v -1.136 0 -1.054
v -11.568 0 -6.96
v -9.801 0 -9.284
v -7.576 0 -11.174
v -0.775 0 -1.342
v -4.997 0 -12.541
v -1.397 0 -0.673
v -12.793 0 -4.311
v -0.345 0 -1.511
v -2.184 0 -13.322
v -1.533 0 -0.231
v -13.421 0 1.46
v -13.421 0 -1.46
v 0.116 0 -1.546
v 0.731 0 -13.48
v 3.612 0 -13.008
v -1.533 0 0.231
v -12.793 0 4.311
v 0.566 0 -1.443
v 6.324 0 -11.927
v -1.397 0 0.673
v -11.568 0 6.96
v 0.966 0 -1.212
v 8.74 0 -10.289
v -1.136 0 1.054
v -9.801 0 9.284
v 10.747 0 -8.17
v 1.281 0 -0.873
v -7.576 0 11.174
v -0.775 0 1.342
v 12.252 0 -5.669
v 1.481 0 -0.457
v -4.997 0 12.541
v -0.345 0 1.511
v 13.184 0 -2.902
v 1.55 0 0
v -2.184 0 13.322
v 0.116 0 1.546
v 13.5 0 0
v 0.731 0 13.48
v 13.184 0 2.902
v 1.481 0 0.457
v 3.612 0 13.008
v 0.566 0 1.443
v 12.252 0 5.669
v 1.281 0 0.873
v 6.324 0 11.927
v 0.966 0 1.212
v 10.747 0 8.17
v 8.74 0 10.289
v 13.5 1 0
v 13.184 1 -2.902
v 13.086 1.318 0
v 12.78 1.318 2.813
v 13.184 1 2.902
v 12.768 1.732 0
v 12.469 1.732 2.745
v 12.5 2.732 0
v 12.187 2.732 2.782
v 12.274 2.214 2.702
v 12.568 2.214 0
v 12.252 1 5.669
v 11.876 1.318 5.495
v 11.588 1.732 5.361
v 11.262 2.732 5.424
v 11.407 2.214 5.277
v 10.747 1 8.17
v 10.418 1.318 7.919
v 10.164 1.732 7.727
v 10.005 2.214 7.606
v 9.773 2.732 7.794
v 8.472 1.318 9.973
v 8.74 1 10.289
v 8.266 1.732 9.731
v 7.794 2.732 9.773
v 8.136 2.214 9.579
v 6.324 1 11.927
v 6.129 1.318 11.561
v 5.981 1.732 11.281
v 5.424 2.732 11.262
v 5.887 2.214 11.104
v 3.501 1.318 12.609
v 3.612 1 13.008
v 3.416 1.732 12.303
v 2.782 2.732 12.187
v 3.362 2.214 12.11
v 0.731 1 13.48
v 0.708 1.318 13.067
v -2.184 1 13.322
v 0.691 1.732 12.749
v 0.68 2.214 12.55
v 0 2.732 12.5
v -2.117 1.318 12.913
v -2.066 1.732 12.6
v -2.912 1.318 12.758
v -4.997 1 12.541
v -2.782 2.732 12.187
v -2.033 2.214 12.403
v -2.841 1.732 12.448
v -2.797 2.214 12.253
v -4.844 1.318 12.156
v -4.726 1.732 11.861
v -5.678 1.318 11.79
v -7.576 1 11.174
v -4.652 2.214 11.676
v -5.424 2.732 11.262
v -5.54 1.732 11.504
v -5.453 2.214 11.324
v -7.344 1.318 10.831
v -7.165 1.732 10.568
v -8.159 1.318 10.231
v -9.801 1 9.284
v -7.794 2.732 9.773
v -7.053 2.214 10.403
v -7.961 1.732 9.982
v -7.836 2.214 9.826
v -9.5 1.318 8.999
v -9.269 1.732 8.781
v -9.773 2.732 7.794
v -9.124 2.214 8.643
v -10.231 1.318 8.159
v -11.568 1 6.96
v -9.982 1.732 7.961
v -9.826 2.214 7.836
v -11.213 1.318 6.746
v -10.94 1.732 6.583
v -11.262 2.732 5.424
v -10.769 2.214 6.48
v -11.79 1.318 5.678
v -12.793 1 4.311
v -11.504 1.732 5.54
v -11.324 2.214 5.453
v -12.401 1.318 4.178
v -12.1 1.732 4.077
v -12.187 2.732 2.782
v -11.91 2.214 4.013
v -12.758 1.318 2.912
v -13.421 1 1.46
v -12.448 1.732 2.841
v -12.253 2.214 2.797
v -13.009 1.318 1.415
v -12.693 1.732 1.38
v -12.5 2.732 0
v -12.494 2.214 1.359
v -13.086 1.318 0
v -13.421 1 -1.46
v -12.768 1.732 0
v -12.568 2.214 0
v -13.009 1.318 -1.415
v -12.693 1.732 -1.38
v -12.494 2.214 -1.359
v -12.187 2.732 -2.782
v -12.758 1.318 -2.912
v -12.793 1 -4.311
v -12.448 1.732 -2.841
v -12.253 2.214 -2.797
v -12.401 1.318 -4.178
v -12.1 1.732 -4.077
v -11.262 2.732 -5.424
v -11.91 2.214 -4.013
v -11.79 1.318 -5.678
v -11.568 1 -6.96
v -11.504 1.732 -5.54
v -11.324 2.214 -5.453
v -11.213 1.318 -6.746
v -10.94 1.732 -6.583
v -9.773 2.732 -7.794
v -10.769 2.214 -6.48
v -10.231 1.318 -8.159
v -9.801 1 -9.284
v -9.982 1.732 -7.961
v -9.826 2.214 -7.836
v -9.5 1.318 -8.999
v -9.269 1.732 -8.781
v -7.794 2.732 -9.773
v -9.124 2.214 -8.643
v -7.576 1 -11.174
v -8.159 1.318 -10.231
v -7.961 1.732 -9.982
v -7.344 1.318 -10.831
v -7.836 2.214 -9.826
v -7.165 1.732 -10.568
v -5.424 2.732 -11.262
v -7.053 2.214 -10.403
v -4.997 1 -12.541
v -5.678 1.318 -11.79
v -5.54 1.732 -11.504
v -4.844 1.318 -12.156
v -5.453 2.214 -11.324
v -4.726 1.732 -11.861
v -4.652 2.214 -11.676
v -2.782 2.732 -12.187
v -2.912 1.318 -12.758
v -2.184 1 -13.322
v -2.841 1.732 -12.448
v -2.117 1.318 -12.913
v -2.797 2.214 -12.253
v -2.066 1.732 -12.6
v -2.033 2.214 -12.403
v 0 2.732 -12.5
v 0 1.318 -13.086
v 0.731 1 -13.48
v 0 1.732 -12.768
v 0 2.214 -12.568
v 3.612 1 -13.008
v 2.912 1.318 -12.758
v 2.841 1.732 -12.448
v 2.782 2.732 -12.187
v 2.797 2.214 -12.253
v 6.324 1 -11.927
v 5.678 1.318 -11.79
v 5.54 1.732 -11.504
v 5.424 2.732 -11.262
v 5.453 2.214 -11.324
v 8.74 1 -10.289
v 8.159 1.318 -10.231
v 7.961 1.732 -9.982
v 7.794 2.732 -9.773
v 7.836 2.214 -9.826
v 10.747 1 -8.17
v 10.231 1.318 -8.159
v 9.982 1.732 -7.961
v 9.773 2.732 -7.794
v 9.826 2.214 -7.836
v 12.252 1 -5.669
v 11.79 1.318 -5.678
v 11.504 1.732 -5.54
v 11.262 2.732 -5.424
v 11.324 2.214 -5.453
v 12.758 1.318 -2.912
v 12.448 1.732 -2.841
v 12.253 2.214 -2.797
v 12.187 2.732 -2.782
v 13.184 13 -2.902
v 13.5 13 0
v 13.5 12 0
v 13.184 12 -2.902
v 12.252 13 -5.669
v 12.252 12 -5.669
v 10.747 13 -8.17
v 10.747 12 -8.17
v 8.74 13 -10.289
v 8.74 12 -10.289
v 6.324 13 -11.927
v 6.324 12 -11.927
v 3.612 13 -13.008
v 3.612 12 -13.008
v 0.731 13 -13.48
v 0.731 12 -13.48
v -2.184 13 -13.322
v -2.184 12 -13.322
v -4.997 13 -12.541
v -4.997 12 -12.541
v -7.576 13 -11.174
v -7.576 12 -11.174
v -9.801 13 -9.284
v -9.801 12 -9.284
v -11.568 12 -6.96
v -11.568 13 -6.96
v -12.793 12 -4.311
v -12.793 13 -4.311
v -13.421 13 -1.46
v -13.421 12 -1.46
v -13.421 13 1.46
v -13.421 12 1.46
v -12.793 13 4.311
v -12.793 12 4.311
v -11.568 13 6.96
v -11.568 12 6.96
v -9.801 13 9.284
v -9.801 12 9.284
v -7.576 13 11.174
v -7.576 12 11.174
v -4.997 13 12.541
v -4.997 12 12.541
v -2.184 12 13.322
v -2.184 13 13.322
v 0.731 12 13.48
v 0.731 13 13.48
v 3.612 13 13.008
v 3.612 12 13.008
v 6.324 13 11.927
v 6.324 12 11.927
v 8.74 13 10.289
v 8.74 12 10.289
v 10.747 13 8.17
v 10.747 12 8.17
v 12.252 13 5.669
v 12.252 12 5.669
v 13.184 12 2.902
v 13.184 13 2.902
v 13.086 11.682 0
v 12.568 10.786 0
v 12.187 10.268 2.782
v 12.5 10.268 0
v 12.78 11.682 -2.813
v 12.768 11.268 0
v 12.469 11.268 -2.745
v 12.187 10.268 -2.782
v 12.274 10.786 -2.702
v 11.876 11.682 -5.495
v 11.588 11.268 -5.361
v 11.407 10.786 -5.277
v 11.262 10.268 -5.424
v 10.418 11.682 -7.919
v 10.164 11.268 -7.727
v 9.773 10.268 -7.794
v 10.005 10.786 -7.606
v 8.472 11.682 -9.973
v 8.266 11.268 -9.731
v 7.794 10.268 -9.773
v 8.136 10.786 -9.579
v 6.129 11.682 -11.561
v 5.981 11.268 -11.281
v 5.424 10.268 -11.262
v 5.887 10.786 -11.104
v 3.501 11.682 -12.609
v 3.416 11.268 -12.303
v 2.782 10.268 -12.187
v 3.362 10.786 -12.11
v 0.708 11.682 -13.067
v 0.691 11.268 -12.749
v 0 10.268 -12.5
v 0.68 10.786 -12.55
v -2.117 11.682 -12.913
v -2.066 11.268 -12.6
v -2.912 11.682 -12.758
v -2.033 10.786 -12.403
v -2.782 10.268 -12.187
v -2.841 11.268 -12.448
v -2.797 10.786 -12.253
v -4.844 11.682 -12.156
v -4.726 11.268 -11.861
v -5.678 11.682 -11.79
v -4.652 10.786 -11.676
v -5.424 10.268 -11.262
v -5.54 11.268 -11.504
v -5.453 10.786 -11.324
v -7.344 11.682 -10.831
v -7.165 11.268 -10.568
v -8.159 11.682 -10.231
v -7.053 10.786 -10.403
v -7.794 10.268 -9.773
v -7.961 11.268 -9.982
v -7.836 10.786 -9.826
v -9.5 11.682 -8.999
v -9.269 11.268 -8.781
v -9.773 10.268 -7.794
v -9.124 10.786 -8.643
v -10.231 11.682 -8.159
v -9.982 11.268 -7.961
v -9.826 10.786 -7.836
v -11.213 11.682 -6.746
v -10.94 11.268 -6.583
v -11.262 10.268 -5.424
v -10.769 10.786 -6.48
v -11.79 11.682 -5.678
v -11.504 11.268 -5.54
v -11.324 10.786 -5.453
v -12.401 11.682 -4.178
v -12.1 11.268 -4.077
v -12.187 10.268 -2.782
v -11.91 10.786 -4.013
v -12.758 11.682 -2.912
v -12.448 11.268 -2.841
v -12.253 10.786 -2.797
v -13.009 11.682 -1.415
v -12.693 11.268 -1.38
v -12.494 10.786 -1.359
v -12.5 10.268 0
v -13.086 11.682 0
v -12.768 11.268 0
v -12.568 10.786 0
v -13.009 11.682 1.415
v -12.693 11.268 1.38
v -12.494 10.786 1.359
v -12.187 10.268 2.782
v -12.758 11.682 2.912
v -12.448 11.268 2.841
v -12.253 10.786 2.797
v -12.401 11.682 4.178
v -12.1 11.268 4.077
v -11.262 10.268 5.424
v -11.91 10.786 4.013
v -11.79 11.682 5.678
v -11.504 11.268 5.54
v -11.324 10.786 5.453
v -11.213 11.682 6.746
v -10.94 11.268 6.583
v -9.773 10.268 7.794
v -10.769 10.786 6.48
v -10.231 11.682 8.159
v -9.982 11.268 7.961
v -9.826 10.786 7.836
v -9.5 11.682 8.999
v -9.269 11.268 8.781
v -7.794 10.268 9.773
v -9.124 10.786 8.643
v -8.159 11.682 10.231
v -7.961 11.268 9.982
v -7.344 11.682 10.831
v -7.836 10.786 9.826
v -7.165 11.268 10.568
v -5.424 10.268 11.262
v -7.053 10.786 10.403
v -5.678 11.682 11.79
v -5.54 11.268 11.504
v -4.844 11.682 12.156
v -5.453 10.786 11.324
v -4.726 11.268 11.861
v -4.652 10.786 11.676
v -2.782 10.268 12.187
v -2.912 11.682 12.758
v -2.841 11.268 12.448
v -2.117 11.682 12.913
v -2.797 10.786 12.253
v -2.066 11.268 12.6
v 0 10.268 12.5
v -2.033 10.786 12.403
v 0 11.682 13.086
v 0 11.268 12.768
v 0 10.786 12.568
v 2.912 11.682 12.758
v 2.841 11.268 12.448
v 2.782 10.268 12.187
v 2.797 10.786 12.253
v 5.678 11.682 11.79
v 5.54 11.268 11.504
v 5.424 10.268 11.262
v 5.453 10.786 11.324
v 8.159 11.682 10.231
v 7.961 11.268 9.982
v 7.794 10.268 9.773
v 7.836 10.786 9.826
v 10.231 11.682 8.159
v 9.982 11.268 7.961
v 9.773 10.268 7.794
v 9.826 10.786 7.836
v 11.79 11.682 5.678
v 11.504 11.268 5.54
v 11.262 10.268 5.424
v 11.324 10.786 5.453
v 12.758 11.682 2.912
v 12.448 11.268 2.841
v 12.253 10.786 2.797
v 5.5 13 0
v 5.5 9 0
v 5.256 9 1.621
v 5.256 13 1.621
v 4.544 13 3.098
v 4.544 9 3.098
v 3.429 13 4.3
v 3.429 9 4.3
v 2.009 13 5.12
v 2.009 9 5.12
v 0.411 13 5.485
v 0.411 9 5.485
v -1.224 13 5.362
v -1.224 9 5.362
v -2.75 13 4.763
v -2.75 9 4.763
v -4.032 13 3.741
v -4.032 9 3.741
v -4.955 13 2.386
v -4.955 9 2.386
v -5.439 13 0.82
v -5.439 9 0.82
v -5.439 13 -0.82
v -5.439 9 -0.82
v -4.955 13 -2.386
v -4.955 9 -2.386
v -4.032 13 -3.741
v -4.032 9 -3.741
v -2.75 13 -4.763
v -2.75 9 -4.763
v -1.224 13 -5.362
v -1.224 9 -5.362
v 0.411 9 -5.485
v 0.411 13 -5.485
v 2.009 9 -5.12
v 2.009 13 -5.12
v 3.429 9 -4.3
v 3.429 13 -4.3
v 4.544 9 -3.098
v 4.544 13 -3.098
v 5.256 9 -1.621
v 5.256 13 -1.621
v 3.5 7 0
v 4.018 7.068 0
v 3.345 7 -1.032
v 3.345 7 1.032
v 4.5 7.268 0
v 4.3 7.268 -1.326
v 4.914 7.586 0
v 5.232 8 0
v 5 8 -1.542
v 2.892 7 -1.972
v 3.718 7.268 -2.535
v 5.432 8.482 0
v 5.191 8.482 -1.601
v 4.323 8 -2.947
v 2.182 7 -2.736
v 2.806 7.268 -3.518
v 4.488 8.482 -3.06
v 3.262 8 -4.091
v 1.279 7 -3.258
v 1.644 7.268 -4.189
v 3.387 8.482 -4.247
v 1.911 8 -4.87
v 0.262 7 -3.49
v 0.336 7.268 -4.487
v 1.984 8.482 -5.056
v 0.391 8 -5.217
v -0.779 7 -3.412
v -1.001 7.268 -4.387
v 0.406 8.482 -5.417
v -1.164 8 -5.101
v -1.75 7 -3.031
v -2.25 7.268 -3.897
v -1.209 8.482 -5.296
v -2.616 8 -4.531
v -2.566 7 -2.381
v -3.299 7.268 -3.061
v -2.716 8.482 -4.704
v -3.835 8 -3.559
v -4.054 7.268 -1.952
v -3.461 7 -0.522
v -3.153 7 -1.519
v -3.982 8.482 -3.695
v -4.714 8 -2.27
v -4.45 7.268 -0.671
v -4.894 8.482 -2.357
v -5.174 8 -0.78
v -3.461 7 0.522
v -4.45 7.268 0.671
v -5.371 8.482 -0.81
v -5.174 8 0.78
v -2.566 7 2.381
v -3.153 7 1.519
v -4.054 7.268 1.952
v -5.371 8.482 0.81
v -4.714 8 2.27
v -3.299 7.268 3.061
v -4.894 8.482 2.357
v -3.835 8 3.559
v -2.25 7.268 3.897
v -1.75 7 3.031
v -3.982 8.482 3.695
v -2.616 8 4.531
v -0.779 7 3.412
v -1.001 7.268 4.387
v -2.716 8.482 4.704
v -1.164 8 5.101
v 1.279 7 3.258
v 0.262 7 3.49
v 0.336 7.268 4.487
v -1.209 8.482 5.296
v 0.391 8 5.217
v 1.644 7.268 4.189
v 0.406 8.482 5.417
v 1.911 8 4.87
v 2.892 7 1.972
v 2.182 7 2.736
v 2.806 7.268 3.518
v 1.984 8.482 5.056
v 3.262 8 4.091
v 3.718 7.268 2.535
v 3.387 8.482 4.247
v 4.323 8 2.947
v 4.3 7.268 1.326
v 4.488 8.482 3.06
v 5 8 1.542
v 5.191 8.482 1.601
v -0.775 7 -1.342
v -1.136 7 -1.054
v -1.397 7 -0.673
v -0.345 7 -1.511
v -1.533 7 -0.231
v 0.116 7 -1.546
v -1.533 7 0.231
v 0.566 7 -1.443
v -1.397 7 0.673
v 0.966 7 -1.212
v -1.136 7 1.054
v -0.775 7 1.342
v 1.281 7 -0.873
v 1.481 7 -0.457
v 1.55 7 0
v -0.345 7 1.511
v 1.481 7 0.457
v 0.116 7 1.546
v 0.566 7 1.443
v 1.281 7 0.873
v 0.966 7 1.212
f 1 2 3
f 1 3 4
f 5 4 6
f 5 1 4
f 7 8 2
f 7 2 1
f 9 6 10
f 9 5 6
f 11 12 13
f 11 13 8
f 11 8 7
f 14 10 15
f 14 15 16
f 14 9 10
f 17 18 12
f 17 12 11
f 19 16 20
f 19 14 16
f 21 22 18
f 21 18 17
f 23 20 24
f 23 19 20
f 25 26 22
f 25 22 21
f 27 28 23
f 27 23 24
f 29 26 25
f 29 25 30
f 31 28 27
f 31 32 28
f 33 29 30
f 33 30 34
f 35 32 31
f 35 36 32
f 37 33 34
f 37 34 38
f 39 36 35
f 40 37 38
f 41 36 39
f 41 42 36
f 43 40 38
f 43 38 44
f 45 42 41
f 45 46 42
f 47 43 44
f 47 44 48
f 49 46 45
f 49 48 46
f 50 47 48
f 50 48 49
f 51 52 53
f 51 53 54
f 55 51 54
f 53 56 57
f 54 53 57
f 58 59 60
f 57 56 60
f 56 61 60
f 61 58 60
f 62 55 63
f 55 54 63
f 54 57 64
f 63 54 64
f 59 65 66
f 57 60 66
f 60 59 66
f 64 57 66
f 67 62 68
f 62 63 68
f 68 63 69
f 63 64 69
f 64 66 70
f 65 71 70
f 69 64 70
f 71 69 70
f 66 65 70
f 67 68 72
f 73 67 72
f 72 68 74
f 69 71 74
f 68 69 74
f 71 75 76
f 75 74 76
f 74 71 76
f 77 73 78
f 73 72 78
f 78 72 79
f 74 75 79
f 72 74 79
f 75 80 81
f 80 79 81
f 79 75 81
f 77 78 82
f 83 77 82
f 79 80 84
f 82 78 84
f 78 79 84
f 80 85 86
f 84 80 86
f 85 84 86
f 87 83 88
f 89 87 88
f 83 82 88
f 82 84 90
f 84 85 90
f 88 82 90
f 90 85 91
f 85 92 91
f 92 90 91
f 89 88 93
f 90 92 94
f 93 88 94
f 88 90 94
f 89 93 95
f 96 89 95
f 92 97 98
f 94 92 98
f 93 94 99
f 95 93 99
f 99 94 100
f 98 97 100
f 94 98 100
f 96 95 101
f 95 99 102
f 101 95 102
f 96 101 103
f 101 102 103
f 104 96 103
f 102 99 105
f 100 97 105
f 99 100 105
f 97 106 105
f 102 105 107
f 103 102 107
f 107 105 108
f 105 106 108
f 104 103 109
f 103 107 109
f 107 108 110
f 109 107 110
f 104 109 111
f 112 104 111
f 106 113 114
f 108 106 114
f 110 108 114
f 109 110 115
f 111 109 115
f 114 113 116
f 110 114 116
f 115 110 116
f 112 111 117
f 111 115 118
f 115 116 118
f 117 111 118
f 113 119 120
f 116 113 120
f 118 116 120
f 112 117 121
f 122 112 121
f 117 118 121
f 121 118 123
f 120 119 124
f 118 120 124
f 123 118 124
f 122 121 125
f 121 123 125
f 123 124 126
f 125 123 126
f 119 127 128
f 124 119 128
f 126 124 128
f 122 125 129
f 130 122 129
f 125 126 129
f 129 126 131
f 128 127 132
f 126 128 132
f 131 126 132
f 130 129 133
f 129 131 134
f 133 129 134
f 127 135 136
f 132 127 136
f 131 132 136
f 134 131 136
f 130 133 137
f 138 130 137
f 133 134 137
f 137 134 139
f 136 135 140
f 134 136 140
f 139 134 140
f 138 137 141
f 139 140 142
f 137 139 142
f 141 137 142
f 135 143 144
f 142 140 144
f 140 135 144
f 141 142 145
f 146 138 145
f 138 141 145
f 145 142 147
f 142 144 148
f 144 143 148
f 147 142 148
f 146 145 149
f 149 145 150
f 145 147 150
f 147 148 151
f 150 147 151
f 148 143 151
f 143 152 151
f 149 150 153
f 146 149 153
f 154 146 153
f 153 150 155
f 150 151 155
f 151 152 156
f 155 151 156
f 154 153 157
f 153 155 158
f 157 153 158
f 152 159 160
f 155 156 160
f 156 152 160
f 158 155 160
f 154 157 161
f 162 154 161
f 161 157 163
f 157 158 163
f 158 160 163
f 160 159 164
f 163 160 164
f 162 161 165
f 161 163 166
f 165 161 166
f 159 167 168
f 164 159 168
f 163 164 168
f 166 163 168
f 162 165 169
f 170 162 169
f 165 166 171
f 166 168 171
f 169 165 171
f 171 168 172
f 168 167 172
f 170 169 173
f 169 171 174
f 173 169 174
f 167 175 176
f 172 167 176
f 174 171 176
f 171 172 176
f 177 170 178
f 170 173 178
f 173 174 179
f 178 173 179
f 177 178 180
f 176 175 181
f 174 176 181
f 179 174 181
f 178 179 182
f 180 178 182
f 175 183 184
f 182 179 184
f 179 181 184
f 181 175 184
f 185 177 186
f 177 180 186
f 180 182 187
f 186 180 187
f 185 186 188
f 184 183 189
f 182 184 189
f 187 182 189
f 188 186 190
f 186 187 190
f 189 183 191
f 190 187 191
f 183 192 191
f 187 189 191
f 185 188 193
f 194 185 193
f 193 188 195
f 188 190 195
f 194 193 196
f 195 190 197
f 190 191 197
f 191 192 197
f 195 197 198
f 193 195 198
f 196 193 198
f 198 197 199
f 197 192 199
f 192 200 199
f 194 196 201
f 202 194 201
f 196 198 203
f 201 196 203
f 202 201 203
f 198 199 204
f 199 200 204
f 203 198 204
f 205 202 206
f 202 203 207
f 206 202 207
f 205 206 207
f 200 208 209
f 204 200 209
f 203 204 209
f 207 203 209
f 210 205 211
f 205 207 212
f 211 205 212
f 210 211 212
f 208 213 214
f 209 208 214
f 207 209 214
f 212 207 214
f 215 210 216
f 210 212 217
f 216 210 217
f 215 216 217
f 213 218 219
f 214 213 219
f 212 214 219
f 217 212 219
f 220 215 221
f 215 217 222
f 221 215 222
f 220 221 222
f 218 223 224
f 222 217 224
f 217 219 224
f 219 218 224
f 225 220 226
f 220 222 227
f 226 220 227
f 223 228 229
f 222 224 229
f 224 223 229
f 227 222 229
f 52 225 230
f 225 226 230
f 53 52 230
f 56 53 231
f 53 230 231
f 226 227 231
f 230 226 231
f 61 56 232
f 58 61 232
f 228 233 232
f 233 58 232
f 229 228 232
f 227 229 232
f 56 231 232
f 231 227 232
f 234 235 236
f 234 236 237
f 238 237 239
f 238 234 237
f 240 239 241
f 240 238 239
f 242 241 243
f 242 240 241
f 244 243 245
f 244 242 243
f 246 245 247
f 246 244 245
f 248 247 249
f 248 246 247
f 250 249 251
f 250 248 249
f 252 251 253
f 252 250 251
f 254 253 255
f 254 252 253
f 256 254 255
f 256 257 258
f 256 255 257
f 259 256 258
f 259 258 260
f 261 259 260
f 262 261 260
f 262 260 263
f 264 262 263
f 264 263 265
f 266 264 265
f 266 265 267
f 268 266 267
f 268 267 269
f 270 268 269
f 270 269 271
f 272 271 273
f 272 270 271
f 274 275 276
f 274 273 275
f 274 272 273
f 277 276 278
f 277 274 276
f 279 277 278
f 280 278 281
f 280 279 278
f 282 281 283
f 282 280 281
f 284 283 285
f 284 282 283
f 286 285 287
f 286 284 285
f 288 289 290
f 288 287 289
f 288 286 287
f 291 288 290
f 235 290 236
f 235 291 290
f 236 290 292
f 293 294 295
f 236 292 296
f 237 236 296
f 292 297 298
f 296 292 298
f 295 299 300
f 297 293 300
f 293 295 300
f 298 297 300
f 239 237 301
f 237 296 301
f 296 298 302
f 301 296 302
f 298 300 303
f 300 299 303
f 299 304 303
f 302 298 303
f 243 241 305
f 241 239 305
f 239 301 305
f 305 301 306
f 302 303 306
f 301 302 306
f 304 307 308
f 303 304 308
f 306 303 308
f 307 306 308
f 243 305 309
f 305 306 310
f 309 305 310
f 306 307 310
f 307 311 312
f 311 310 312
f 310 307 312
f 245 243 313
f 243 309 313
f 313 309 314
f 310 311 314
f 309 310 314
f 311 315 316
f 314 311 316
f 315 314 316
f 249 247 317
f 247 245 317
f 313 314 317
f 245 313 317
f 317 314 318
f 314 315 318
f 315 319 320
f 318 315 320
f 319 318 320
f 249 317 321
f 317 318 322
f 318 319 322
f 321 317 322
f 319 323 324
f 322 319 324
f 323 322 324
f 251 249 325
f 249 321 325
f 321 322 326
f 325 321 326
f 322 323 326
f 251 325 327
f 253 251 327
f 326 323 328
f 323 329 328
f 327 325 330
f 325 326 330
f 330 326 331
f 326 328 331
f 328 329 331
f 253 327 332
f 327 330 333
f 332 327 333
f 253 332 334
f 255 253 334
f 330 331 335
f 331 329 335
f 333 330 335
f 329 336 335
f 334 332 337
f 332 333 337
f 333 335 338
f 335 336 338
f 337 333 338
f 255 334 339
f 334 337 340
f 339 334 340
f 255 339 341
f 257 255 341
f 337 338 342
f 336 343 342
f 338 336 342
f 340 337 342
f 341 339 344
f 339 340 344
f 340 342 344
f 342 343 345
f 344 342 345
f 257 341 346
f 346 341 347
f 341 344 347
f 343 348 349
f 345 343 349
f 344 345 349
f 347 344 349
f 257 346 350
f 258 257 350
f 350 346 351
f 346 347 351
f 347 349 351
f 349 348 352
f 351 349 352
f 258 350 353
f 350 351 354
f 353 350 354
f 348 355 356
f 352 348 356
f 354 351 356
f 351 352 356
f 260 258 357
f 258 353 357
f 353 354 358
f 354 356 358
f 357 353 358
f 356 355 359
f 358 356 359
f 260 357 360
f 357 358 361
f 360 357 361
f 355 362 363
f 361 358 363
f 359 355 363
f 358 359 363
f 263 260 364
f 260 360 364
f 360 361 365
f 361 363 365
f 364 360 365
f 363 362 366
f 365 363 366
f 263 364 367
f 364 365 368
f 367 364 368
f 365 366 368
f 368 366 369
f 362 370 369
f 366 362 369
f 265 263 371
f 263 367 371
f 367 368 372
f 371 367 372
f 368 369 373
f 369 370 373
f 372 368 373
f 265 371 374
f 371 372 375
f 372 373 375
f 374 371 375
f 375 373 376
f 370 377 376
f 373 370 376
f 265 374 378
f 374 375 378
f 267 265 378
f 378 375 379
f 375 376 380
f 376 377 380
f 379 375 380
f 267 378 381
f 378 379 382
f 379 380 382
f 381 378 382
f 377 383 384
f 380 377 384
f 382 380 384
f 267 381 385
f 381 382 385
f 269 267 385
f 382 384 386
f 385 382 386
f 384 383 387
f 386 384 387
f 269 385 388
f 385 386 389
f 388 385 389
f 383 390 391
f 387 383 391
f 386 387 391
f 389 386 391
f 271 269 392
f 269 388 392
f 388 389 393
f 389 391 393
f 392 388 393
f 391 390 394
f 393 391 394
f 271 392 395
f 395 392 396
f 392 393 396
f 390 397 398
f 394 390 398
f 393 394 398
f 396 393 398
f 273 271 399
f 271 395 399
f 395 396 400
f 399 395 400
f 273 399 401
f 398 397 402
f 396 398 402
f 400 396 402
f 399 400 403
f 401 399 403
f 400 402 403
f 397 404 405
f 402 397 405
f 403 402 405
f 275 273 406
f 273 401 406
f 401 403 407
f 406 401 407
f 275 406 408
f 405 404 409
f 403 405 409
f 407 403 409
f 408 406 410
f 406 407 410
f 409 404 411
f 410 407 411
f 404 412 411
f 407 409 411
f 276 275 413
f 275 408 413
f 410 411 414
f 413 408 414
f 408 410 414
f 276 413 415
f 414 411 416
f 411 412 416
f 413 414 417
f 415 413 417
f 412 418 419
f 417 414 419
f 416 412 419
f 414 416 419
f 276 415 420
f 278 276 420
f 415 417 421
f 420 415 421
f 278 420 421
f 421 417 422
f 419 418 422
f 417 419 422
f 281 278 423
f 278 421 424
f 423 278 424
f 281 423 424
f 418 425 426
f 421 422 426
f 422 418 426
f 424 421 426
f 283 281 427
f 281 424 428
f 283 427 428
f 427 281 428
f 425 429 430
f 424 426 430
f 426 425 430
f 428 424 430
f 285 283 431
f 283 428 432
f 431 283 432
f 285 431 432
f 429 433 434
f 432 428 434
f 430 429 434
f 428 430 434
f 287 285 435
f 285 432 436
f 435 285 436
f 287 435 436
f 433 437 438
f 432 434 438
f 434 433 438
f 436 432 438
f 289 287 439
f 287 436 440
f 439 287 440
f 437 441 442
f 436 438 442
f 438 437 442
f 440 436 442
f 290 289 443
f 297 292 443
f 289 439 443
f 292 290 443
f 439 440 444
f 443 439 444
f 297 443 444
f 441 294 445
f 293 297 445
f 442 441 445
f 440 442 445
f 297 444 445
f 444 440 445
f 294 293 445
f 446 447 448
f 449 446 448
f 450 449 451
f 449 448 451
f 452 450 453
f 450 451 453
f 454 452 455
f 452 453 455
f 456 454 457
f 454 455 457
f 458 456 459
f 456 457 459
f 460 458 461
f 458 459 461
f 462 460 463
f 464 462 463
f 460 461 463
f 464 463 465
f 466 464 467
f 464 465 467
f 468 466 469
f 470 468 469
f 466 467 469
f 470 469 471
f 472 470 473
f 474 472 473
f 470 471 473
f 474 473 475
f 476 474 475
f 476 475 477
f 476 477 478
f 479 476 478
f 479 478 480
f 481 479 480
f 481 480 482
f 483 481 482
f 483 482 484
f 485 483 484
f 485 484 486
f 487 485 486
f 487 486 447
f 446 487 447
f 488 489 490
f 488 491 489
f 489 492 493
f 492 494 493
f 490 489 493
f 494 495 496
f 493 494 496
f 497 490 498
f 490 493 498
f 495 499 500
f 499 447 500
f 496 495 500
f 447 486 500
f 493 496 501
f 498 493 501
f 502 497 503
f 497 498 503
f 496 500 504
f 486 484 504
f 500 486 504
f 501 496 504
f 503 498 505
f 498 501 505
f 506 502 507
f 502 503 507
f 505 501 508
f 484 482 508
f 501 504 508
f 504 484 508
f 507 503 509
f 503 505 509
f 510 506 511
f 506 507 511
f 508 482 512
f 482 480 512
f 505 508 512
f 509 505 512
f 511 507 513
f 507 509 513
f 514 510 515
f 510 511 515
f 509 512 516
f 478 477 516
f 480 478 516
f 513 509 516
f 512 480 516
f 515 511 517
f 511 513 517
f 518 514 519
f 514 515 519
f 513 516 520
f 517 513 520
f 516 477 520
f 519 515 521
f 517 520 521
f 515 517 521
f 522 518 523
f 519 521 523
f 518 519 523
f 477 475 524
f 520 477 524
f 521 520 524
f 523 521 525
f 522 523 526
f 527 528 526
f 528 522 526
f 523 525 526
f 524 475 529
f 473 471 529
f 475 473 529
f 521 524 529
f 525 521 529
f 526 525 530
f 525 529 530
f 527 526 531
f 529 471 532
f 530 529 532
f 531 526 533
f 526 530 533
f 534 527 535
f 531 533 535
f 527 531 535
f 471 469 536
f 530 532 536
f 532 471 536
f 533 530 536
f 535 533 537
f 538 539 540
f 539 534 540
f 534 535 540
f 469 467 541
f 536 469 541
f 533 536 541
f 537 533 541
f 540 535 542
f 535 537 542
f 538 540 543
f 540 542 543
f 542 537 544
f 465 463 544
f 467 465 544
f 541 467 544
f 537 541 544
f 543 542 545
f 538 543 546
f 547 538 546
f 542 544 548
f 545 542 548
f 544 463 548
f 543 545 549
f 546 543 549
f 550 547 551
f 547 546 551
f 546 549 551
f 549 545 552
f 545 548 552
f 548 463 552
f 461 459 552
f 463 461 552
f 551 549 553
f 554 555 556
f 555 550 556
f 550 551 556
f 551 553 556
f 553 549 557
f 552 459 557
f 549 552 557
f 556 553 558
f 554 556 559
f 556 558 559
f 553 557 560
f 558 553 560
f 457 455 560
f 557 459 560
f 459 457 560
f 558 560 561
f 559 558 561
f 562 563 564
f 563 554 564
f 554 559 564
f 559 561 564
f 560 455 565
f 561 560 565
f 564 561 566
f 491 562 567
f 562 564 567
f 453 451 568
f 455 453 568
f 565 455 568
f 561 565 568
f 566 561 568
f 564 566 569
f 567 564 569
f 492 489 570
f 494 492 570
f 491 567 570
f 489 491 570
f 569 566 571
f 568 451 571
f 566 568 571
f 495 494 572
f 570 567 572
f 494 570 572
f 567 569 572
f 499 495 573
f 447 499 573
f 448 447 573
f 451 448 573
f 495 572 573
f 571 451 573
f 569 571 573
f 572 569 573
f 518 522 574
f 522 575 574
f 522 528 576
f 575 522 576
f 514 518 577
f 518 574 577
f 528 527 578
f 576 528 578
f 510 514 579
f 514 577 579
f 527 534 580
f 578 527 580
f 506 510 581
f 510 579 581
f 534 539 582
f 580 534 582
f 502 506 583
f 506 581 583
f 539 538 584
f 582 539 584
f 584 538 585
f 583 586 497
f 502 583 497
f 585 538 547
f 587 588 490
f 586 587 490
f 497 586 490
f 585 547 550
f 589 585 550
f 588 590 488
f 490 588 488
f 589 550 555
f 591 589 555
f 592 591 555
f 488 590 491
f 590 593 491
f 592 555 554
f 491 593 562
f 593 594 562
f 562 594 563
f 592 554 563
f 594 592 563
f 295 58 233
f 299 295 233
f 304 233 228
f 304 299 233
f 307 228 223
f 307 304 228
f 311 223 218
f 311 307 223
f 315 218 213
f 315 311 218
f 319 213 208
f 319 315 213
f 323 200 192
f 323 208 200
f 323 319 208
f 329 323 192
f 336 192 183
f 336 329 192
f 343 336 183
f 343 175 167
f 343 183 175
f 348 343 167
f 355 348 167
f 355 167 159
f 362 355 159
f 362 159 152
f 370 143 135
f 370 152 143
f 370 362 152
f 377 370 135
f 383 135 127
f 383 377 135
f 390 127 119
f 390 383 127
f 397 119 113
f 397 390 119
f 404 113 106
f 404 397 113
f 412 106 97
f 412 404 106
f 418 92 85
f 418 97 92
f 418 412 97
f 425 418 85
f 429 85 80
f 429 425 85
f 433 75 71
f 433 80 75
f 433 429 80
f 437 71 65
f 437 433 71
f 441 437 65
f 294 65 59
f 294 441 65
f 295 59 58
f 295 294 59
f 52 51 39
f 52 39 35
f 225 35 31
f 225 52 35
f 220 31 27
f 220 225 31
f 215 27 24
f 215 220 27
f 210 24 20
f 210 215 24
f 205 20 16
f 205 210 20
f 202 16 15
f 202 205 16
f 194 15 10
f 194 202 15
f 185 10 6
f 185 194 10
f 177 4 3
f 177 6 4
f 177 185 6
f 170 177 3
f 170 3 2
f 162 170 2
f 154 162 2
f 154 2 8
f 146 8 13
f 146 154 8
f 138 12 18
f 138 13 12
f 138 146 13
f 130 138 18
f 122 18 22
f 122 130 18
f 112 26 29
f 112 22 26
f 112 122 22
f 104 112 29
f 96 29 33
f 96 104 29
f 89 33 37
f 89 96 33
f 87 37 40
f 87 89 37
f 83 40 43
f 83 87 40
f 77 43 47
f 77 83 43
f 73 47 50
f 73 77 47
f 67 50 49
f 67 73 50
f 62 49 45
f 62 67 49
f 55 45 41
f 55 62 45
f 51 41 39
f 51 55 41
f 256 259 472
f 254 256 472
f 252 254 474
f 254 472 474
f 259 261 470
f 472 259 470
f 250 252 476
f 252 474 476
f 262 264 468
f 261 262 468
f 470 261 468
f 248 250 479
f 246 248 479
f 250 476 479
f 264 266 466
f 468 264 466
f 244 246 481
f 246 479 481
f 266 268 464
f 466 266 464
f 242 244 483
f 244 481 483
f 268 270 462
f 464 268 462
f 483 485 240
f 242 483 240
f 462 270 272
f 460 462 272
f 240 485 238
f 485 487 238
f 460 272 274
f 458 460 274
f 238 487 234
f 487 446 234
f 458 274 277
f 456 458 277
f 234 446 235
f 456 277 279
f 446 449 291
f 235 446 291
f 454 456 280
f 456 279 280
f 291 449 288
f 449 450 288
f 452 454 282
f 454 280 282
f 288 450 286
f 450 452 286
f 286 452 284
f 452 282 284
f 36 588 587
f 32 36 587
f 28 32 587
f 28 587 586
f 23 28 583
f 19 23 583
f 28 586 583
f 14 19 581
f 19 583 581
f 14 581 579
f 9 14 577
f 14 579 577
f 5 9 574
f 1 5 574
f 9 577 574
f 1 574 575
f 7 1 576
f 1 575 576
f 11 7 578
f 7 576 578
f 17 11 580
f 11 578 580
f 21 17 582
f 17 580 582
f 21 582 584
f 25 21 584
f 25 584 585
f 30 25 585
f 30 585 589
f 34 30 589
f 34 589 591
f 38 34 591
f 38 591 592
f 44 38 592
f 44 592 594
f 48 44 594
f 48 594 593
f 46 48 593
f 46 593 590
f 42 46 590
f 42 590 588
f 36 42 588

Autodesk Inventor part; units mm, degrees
ref_plane "YZ Plane" through (0, 0, 0) normal (1, 0, 0) x (0, 1, 0)
ref_plane "XZ Plane" through (0, 0, 0) normal (0, 1, 0) x (-1, 0, 0)
ref_plane "XY Plane" through (0, 0, 0) normal (0, 0, 1) x (1, 0, 0)
sketch "Szkic1" plane through (0, 0, 0) normal (0, 0, 1) x (1, 0, 0)
  line L0 (0, 0) -> (13.5, 0)
  line L1 (13.5, 0) -> (13.5, 1)
  line L2 (13.5, 1) -> (12.5, 1)
  line L3 (12.5, 1) -> (12.5, 12)
  line L4 (12.5, 12) -> (13.5, 12)
  line L5 (13.5, 12) -> (13.5, 13)
  line L6 (13.5, 13) -> (5.5, 13)
  line L7 (5.5, 13) -> (5.5, 7)
  line L8 (5.5, 7) -> (3.1, 7)
  line L9 (3.1, 7) -> (0, 7)
  line L10 (0, 7) -> (0, 0)
  dimension "d0" = 13.5
  dimension "d1" = 1
  dimension "d2" = 1
  dimension "d3" = 11
  dimension "d4" = 1
  dimension "d5" = 1
  dimension "d6" = 8
  dimension "d7" = 6
  dimension "d8" = 2.4
revolve "Obrót1" add sketch "Szkic1" angle 360 about axis through (0, 7, 0) along (0, -1, 0)
sketch "Szkic2" plane through (0, 7, 0) normal (0, 1, 0) x (1, 0, 0)
  circle A0 centre (0, 0) radius 5.5 projected
  circle A1 centre (0, 0) radius 1.55
  dimension "d10" = 3.1
extrude "Wyciągnięcie proste1" cut sketch "Szkic2" against normal blind 10 contours A1
fillet "Zaokrąglenie1" radius 2 3 edges at (-12.5, 1, 0) (-12.5, 12, 0) (-5.5, 7, 0)
properties part number "Kolo"
